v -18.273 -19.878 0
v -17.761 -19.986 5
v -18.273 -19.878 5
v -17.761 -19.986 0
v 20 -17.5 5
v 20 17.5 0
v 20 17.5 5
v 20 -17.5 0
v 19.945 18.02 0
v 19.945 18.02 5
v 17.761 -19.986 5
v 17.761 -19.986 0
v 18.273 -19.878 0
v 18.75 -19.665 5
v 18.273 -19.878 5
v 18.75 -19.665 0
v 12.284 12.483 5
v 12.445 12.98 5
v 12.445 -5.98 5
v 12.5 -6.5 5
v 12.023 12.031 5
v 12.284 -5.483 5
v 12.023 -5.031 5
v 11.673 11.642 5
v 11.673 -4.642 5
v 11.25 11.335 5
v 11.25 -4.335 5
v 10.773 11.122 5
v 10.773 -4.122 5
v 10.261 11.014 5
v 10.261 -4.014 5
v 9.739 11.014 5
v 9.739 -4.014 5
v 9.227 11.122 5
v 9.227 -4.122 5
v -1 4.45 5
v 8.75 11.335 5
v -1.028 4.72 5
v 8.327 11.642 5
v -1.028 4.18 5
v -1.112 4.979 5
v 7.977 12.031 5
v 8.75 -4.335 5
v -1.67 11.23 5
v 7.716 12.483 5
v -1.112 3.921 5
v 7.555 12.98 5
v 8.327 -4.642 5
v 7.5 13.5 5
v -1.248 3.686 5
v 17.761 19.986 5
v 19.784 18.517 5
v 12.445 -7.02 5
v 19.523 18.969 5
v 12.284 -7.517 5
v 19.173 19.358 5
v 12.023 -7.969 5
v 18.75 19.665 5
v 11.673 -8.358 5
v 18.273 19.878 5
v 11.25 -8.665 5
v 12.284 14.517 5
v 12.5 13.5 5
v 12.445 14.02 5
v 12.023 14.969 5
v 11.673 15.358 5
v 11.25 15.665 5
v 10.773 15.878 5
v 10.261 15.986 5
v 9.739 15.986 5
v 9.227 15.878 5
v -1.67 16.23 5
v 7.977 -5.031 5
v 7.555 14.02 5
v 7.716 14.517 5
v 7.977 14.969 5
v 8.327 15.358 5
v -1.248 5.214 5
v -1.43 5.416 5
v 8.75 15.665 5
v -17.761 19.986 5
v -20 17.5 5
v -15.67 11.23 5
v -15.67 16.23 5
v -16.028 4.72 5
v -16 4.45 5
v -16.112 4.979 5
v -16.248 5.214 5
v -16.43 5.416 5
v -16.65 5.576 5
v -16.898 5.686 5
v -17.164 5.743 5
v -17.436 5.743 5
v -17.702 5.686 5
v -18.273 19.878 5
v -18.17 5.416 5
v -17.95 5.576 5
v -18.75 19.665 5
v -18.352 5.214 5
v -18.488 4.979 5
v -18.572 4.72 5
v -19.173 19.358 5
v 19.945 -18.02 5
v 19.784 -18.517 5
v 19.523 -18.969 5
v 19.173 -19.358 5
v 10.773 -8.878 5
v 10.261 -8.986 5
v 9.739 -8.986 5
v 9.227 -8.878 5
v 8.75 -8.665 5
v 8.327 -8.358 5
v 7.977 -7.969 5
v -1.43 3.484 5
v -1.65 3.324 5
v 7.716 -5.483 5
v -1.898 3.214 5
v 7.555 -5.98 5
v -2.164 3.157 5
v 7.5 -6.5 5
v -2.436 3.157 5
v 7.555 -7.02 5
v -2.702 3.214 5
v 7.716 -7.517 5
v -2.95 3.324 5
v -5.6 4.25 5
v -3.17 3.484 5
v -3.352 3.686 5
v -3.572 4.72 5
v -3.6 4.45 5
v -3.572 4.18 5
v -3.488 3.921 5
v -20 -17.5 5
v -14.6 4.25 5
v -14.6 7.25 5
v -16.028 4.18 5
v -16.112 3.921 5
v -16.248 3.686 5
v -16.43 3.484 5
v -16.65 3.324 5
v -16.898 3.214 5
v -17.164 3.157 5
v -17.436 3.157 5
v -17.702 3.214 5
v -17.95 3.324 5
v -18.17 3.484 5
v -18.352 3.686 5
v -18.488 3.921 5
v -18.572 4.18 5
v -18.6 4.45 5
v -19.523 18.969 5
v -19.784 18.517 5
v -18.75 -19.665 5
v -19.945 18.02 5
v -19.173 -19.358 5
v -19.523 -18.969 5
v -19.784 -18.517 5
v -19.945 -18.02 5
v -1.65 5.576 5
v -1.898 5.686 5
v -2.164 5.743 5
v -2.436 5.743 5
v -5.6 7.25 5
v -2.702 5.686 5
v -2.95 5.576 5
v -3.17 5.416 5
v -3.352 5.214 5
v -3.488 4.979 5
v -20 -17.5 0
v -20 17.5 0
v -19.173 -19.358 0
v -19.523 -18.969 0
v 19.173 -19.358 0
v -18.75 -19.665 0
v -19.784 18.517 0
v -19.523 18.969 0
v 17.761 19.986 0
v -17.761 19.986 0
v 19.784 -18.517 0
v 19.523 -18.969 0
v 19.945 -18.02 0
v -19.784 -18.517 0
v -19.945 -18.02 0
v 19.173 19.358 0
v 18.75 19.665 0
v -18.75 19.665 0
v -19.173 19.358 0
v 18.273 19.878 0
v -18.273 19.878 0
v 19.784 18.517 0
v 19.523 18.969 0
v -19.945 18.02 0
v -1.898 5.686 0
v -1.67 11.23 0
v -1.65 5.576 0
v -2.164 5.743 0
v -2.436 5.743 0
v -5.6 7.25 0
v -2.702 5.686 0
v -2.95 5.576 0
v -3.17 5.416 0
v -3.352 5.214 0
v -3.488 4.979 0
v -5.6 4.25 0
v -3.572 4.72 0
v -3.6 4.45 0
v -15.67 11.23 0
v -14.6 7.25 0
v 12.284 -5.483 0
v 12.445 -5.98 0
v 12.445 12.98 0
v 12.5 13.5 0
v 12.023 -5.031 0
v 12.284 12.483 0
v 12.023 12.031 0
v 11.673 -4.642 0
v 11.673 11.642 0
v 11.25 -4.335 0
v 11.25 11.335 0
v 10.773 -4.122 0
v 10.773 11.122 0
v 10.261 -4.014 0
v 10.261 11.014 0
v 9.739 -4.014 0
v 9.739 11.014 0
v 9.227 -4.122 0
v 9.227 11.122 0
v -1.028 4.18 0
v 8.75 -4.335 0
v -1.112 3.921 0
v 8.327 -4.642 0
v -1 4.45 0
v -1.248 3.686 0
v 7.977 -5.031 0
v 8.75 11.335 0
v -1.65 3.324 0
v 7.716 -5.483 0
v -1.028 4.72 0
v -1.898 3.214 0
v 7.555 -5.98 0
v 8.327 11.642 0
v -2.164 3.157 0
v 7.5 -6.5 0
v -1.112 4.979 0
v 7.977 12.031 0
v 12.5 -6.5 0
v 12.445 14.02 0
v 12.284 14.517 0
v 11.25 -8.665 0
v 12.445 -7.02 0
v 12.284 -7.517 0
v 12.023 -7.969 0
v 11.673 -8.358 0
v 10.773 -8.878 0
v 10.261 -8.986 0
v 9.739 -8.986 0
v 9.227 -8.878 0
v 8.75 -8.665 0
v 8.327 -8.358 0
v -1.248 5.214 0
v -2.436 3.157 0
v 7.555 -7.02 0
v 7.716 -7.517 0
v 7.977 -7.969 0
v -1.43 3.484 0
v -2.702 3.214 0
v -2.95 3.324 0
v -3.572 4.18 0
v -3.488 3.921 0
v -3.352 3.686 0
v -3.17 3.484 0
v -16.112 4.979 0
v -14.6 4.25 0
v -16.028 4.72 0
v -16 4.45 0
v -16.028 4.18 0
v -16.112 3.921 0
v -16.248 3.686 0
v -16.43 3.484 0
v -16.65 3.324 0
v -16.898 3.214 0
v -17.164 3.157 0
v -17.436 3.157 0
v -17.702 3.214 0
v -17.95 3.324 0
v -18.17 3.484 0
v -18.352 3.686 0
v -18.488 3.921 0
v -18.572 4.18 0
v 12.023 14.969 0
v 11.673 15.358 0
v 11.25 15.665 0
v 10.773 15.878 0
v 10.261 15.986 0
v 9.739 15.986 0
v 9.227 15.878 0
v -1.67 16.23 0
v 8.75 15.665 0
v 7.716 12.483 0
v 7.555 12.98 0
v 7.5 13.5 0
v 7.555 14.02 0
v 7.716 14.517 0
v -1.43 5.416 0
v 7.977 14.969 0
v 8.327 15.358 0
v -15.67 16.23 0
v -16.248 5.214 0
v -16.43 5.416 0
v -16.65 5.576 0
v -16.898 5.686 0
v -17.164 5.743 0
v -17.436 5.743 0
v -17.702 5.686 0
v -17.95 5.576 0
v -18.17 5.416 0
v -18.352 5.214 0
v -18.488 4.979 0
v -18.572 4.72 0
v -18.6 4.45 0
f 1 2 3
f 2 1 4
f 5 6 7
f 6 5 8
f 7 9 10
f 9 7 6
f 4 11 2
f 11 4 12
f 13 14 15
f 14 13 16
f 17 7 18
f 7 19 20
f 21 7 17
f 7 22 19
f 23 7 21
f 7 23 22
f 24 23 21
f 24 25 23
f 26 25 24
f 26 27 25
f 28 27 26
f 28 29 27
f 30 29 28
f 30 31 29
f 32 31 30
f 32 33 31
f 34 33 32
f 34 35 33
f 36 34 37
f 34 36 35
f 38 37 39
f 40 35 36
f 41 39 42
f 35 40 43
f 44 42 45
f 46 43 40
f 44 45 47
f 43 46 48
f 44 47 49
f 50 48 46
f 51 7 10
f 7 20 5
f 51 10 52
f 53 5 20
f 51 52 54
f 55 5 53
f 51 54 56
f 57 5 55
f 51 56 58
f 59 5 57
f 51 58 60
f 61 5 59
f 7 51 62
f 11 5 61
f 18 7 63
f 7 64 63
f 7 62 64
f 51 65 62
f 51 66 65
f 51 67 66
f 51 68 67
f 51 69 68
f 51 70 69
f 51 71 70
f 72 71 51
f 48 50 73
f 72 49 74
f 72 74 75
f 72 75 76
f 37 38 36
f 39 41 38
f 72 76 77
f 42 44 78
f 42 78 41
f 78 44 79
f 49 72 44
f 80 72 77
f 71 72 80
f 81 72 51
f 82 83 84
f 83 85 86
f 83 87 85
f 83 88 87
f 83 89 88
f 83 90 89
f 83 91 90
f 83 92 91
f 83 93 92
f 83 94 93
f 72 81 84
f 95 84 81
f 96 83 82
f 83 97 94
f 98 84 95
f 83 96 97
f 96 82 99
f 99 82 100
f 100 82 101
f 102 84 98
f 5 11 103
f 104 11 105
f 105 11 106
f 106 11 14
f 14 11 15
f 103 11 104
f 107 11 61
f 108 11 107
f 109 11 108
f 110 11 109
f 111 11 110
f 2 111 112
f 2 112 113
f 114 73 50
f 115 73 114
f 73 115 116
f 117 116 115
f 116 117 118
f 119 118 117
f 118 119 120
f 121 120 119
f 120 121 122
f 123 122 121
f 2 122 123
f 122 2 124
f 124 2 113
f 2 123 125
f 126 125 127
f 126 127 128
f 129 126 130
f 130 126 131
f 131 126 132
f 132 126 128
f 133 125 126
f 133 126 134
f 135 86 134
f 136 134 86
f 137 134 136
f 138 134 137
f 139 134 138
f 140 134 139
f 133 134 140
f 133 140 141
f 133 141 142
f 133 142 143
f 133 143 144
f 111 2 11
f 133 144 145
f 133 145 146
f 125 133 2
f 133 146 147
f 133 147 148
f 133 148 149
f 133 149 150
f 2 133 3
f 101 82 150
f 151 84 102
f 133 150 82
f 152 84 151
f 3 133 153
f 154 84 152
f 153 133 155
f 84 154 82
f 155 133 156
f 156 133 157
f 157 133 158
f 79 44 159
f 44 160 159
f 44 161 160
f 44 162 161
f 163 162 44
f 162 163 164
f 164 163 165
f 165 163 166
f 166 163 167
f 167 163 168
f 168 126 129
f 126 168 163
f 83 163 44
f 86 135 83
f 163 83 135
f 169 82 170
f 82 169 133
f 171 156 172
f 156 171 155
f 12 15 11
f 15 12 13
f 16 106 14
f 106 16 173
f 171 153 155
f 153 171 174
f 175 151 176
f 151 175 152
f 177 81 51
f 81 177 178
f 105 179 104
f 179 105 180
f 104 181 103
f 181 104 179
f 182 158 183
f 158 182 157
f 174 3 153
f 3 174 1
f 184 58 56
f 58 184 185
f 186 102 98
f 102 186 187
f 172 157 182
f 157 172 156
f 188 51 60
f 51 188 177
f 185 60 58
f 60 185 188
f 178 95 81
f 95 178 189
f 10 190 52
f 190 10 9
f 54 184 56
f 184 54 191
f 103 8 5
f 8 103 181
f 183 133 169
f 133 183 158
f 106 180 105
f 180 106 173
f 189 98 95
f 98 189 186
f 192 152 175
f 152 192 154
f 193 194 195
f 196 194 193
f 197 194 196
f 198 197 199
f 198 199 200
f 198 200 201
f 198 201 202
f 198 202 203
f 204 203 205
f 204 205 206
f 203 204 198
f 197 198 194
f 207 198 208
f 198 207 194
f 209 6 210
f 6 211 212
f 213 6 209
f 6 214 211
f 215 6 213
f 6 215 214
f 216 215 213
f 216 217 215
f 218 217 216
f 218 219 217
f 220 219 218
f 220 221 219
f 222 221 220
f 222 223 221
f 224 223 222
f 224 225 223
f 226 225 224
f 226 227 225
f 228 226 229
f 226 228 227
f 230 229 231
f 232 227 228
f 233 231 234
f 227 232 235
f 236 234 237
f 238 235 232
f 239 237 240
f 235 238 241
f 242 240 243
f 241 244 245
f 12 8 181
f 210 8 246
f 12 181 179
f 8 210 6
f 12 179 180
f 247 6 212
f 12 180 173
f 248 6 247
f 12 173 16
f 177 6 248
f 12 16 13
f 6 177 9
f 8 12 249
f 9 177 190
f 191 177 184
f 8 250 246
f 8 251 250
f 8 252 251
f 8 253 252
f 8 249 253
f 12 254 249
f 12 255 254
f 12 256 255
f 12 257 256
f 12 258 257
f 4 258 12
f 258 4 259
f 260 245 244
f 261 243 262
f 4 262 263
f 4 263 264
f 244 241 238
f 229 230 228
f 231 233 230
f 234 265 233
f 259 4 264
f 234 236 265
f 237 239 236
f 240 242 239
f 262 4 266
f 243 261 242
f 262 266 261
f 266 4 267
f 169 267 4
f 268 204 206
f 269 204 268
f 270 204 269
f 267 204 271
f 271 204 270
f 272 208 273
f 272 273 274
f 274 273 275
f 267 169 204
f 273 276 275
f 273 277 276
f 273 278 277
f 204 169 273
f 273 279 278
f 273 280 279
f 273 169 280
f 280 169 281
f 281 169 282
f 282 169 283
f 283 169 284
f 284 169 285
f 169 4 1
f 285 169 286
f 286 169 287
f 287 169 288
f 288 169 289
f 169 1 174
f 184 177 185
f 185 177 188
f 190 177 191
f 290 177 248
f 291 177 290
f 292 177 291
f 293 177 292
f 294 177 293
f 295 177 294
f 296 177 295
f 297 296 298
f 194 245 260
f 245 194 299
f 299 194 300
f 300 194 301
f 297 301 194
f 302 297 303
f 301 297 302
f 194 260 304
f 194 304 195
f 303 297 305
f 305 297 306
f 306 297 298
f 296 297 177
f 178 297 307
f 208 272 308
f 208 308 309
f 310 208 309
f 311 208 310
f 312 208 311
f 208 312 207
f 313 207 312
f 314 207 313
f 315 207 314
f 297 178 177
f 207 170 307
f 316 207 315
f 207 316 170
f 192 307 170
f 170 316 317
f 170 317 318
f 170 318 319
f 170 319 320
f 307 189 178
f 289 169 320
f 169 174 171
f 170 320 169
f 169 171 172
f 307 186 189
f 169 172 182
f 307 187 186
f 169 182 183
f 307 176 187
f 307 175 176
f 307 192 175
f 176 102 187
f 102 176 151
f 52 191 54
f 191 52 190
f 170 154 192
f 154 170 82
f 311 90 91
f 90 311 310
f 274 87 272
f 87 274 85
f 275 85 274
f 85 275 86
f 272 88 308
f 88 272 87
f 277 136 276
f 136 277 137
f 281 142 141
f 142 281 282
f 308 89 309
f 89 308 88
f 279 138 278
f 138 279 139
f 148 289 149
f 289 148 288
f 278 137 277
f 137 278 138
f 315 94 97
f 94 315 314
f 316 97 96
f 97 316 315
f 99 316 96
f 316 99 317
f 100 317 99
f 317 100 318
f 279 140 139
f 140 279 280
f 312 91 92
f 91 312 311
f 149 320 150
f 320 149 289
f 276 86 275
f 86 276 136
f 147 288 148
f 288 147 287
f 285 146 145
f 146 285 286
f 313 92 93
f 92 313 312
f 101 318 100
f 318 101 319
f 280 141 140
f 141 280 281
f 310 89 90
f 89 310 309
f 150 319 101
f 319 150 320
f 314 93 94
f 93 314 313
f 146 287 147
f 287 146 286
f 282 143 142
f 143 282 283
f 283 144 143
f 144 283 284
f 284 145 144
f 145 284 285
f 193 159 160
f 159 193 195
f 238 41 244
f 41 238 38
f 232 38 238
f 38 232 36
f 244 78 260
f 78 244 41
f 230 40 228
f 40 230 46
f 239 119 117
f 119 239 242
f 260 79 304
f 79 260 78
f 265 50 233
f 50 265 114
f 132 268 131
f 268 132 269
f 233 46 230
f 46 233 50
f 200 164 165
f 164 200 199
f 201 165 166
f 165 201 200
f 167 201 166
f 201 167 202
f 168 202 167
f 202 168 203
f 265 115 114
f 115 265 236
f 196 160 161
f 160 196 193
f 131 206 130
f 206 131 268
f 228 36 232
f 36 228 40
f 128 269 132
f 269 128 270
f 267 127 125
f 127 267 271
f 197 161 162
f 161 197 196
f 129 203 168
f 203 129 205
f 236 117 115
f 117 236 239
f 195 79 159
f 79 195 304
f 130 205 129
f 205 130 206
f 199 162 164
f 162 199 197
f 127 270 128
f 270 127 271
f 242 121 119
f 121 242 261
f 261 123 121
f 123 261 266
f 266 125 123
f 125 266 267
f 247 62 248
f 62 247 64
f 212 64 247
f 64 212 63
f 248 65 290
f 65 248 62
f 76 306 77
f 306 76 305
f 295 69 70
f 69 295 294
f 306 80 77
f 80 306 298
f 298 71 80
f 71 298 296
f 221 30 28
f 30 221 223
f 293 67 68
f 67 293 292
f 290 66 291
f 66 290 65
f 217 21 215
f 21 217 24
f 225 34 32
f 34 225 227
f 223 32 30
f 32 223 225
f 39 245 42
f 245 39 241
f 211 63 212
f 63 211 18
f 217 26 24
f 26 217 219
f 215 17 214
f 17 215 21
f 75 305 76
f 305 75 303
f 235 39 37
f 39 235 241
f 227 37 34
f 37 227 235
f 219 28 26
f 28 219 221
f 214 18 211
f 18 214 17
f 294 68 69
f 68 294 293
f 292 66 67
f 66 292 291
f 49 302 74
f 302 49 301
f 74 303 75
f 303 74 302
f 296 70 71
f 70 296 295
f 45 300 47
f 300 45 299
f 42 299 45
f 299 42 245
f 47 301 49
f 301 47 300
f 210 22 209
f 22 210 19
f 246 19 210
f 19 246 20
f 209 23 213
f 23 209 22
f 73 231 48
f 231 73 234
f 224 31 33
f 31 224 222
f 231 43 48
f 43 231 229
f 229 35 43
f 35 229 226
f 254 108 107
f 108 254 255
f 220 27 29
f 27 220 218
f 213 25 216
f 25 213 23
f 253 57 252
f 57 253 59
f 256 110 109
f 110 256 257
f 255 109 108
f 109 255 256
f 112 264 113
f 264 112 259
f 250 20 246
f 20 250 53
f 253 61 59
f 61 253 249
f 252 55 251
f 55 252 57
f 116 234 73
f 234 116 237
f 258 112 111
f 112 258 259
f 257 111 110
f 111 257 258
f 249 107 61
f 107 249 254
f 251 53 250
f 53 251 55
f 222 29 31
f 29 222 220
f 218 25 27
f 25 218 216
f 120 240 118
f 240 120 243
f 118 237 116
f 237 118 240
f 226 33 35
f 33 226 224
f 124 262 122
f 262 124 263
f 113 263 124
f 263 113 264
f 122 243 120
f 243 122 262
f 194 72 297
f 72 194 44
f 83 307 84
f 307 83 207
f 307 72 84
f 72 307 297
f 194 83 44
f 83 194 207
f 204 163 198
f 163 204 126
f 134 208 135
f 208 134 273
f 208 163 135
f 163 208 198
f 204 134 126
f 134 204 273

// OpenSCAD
$fn=30;
offset=0;
zlimit();
module zlimit(){
    difference(){
        union(){
            hull() for(X=[-1,1], Y=[-1,1])
                translate([17.5*X, 17.5*Y, 0]) cylinder(d=5, h=5);
            translate([10,0,0])
            hull() for(X=[-1,1], Y=[17.5,-10-offset])
                translate([7.5*X, Y, 0]) cylinder(d=5, h=5);
             
        }
        translate([-9.8,4.45,-0.5]) for(X=[-1,1]){
            translate([7.5*X,0,0]) cylinder(d=2.6, h=6);
        }
        translate([-20+4.33,15-3.77,-0.5]) cube([14,5,6]);
        translate([-20+5.4,17-12.75,-0.5]) cube([9,3,6]);
        
        for(Y=[0,-20])
            translate([10,13.5+Y-offset,-0.5]) cylinder(d=5, h=6);
    }
}
